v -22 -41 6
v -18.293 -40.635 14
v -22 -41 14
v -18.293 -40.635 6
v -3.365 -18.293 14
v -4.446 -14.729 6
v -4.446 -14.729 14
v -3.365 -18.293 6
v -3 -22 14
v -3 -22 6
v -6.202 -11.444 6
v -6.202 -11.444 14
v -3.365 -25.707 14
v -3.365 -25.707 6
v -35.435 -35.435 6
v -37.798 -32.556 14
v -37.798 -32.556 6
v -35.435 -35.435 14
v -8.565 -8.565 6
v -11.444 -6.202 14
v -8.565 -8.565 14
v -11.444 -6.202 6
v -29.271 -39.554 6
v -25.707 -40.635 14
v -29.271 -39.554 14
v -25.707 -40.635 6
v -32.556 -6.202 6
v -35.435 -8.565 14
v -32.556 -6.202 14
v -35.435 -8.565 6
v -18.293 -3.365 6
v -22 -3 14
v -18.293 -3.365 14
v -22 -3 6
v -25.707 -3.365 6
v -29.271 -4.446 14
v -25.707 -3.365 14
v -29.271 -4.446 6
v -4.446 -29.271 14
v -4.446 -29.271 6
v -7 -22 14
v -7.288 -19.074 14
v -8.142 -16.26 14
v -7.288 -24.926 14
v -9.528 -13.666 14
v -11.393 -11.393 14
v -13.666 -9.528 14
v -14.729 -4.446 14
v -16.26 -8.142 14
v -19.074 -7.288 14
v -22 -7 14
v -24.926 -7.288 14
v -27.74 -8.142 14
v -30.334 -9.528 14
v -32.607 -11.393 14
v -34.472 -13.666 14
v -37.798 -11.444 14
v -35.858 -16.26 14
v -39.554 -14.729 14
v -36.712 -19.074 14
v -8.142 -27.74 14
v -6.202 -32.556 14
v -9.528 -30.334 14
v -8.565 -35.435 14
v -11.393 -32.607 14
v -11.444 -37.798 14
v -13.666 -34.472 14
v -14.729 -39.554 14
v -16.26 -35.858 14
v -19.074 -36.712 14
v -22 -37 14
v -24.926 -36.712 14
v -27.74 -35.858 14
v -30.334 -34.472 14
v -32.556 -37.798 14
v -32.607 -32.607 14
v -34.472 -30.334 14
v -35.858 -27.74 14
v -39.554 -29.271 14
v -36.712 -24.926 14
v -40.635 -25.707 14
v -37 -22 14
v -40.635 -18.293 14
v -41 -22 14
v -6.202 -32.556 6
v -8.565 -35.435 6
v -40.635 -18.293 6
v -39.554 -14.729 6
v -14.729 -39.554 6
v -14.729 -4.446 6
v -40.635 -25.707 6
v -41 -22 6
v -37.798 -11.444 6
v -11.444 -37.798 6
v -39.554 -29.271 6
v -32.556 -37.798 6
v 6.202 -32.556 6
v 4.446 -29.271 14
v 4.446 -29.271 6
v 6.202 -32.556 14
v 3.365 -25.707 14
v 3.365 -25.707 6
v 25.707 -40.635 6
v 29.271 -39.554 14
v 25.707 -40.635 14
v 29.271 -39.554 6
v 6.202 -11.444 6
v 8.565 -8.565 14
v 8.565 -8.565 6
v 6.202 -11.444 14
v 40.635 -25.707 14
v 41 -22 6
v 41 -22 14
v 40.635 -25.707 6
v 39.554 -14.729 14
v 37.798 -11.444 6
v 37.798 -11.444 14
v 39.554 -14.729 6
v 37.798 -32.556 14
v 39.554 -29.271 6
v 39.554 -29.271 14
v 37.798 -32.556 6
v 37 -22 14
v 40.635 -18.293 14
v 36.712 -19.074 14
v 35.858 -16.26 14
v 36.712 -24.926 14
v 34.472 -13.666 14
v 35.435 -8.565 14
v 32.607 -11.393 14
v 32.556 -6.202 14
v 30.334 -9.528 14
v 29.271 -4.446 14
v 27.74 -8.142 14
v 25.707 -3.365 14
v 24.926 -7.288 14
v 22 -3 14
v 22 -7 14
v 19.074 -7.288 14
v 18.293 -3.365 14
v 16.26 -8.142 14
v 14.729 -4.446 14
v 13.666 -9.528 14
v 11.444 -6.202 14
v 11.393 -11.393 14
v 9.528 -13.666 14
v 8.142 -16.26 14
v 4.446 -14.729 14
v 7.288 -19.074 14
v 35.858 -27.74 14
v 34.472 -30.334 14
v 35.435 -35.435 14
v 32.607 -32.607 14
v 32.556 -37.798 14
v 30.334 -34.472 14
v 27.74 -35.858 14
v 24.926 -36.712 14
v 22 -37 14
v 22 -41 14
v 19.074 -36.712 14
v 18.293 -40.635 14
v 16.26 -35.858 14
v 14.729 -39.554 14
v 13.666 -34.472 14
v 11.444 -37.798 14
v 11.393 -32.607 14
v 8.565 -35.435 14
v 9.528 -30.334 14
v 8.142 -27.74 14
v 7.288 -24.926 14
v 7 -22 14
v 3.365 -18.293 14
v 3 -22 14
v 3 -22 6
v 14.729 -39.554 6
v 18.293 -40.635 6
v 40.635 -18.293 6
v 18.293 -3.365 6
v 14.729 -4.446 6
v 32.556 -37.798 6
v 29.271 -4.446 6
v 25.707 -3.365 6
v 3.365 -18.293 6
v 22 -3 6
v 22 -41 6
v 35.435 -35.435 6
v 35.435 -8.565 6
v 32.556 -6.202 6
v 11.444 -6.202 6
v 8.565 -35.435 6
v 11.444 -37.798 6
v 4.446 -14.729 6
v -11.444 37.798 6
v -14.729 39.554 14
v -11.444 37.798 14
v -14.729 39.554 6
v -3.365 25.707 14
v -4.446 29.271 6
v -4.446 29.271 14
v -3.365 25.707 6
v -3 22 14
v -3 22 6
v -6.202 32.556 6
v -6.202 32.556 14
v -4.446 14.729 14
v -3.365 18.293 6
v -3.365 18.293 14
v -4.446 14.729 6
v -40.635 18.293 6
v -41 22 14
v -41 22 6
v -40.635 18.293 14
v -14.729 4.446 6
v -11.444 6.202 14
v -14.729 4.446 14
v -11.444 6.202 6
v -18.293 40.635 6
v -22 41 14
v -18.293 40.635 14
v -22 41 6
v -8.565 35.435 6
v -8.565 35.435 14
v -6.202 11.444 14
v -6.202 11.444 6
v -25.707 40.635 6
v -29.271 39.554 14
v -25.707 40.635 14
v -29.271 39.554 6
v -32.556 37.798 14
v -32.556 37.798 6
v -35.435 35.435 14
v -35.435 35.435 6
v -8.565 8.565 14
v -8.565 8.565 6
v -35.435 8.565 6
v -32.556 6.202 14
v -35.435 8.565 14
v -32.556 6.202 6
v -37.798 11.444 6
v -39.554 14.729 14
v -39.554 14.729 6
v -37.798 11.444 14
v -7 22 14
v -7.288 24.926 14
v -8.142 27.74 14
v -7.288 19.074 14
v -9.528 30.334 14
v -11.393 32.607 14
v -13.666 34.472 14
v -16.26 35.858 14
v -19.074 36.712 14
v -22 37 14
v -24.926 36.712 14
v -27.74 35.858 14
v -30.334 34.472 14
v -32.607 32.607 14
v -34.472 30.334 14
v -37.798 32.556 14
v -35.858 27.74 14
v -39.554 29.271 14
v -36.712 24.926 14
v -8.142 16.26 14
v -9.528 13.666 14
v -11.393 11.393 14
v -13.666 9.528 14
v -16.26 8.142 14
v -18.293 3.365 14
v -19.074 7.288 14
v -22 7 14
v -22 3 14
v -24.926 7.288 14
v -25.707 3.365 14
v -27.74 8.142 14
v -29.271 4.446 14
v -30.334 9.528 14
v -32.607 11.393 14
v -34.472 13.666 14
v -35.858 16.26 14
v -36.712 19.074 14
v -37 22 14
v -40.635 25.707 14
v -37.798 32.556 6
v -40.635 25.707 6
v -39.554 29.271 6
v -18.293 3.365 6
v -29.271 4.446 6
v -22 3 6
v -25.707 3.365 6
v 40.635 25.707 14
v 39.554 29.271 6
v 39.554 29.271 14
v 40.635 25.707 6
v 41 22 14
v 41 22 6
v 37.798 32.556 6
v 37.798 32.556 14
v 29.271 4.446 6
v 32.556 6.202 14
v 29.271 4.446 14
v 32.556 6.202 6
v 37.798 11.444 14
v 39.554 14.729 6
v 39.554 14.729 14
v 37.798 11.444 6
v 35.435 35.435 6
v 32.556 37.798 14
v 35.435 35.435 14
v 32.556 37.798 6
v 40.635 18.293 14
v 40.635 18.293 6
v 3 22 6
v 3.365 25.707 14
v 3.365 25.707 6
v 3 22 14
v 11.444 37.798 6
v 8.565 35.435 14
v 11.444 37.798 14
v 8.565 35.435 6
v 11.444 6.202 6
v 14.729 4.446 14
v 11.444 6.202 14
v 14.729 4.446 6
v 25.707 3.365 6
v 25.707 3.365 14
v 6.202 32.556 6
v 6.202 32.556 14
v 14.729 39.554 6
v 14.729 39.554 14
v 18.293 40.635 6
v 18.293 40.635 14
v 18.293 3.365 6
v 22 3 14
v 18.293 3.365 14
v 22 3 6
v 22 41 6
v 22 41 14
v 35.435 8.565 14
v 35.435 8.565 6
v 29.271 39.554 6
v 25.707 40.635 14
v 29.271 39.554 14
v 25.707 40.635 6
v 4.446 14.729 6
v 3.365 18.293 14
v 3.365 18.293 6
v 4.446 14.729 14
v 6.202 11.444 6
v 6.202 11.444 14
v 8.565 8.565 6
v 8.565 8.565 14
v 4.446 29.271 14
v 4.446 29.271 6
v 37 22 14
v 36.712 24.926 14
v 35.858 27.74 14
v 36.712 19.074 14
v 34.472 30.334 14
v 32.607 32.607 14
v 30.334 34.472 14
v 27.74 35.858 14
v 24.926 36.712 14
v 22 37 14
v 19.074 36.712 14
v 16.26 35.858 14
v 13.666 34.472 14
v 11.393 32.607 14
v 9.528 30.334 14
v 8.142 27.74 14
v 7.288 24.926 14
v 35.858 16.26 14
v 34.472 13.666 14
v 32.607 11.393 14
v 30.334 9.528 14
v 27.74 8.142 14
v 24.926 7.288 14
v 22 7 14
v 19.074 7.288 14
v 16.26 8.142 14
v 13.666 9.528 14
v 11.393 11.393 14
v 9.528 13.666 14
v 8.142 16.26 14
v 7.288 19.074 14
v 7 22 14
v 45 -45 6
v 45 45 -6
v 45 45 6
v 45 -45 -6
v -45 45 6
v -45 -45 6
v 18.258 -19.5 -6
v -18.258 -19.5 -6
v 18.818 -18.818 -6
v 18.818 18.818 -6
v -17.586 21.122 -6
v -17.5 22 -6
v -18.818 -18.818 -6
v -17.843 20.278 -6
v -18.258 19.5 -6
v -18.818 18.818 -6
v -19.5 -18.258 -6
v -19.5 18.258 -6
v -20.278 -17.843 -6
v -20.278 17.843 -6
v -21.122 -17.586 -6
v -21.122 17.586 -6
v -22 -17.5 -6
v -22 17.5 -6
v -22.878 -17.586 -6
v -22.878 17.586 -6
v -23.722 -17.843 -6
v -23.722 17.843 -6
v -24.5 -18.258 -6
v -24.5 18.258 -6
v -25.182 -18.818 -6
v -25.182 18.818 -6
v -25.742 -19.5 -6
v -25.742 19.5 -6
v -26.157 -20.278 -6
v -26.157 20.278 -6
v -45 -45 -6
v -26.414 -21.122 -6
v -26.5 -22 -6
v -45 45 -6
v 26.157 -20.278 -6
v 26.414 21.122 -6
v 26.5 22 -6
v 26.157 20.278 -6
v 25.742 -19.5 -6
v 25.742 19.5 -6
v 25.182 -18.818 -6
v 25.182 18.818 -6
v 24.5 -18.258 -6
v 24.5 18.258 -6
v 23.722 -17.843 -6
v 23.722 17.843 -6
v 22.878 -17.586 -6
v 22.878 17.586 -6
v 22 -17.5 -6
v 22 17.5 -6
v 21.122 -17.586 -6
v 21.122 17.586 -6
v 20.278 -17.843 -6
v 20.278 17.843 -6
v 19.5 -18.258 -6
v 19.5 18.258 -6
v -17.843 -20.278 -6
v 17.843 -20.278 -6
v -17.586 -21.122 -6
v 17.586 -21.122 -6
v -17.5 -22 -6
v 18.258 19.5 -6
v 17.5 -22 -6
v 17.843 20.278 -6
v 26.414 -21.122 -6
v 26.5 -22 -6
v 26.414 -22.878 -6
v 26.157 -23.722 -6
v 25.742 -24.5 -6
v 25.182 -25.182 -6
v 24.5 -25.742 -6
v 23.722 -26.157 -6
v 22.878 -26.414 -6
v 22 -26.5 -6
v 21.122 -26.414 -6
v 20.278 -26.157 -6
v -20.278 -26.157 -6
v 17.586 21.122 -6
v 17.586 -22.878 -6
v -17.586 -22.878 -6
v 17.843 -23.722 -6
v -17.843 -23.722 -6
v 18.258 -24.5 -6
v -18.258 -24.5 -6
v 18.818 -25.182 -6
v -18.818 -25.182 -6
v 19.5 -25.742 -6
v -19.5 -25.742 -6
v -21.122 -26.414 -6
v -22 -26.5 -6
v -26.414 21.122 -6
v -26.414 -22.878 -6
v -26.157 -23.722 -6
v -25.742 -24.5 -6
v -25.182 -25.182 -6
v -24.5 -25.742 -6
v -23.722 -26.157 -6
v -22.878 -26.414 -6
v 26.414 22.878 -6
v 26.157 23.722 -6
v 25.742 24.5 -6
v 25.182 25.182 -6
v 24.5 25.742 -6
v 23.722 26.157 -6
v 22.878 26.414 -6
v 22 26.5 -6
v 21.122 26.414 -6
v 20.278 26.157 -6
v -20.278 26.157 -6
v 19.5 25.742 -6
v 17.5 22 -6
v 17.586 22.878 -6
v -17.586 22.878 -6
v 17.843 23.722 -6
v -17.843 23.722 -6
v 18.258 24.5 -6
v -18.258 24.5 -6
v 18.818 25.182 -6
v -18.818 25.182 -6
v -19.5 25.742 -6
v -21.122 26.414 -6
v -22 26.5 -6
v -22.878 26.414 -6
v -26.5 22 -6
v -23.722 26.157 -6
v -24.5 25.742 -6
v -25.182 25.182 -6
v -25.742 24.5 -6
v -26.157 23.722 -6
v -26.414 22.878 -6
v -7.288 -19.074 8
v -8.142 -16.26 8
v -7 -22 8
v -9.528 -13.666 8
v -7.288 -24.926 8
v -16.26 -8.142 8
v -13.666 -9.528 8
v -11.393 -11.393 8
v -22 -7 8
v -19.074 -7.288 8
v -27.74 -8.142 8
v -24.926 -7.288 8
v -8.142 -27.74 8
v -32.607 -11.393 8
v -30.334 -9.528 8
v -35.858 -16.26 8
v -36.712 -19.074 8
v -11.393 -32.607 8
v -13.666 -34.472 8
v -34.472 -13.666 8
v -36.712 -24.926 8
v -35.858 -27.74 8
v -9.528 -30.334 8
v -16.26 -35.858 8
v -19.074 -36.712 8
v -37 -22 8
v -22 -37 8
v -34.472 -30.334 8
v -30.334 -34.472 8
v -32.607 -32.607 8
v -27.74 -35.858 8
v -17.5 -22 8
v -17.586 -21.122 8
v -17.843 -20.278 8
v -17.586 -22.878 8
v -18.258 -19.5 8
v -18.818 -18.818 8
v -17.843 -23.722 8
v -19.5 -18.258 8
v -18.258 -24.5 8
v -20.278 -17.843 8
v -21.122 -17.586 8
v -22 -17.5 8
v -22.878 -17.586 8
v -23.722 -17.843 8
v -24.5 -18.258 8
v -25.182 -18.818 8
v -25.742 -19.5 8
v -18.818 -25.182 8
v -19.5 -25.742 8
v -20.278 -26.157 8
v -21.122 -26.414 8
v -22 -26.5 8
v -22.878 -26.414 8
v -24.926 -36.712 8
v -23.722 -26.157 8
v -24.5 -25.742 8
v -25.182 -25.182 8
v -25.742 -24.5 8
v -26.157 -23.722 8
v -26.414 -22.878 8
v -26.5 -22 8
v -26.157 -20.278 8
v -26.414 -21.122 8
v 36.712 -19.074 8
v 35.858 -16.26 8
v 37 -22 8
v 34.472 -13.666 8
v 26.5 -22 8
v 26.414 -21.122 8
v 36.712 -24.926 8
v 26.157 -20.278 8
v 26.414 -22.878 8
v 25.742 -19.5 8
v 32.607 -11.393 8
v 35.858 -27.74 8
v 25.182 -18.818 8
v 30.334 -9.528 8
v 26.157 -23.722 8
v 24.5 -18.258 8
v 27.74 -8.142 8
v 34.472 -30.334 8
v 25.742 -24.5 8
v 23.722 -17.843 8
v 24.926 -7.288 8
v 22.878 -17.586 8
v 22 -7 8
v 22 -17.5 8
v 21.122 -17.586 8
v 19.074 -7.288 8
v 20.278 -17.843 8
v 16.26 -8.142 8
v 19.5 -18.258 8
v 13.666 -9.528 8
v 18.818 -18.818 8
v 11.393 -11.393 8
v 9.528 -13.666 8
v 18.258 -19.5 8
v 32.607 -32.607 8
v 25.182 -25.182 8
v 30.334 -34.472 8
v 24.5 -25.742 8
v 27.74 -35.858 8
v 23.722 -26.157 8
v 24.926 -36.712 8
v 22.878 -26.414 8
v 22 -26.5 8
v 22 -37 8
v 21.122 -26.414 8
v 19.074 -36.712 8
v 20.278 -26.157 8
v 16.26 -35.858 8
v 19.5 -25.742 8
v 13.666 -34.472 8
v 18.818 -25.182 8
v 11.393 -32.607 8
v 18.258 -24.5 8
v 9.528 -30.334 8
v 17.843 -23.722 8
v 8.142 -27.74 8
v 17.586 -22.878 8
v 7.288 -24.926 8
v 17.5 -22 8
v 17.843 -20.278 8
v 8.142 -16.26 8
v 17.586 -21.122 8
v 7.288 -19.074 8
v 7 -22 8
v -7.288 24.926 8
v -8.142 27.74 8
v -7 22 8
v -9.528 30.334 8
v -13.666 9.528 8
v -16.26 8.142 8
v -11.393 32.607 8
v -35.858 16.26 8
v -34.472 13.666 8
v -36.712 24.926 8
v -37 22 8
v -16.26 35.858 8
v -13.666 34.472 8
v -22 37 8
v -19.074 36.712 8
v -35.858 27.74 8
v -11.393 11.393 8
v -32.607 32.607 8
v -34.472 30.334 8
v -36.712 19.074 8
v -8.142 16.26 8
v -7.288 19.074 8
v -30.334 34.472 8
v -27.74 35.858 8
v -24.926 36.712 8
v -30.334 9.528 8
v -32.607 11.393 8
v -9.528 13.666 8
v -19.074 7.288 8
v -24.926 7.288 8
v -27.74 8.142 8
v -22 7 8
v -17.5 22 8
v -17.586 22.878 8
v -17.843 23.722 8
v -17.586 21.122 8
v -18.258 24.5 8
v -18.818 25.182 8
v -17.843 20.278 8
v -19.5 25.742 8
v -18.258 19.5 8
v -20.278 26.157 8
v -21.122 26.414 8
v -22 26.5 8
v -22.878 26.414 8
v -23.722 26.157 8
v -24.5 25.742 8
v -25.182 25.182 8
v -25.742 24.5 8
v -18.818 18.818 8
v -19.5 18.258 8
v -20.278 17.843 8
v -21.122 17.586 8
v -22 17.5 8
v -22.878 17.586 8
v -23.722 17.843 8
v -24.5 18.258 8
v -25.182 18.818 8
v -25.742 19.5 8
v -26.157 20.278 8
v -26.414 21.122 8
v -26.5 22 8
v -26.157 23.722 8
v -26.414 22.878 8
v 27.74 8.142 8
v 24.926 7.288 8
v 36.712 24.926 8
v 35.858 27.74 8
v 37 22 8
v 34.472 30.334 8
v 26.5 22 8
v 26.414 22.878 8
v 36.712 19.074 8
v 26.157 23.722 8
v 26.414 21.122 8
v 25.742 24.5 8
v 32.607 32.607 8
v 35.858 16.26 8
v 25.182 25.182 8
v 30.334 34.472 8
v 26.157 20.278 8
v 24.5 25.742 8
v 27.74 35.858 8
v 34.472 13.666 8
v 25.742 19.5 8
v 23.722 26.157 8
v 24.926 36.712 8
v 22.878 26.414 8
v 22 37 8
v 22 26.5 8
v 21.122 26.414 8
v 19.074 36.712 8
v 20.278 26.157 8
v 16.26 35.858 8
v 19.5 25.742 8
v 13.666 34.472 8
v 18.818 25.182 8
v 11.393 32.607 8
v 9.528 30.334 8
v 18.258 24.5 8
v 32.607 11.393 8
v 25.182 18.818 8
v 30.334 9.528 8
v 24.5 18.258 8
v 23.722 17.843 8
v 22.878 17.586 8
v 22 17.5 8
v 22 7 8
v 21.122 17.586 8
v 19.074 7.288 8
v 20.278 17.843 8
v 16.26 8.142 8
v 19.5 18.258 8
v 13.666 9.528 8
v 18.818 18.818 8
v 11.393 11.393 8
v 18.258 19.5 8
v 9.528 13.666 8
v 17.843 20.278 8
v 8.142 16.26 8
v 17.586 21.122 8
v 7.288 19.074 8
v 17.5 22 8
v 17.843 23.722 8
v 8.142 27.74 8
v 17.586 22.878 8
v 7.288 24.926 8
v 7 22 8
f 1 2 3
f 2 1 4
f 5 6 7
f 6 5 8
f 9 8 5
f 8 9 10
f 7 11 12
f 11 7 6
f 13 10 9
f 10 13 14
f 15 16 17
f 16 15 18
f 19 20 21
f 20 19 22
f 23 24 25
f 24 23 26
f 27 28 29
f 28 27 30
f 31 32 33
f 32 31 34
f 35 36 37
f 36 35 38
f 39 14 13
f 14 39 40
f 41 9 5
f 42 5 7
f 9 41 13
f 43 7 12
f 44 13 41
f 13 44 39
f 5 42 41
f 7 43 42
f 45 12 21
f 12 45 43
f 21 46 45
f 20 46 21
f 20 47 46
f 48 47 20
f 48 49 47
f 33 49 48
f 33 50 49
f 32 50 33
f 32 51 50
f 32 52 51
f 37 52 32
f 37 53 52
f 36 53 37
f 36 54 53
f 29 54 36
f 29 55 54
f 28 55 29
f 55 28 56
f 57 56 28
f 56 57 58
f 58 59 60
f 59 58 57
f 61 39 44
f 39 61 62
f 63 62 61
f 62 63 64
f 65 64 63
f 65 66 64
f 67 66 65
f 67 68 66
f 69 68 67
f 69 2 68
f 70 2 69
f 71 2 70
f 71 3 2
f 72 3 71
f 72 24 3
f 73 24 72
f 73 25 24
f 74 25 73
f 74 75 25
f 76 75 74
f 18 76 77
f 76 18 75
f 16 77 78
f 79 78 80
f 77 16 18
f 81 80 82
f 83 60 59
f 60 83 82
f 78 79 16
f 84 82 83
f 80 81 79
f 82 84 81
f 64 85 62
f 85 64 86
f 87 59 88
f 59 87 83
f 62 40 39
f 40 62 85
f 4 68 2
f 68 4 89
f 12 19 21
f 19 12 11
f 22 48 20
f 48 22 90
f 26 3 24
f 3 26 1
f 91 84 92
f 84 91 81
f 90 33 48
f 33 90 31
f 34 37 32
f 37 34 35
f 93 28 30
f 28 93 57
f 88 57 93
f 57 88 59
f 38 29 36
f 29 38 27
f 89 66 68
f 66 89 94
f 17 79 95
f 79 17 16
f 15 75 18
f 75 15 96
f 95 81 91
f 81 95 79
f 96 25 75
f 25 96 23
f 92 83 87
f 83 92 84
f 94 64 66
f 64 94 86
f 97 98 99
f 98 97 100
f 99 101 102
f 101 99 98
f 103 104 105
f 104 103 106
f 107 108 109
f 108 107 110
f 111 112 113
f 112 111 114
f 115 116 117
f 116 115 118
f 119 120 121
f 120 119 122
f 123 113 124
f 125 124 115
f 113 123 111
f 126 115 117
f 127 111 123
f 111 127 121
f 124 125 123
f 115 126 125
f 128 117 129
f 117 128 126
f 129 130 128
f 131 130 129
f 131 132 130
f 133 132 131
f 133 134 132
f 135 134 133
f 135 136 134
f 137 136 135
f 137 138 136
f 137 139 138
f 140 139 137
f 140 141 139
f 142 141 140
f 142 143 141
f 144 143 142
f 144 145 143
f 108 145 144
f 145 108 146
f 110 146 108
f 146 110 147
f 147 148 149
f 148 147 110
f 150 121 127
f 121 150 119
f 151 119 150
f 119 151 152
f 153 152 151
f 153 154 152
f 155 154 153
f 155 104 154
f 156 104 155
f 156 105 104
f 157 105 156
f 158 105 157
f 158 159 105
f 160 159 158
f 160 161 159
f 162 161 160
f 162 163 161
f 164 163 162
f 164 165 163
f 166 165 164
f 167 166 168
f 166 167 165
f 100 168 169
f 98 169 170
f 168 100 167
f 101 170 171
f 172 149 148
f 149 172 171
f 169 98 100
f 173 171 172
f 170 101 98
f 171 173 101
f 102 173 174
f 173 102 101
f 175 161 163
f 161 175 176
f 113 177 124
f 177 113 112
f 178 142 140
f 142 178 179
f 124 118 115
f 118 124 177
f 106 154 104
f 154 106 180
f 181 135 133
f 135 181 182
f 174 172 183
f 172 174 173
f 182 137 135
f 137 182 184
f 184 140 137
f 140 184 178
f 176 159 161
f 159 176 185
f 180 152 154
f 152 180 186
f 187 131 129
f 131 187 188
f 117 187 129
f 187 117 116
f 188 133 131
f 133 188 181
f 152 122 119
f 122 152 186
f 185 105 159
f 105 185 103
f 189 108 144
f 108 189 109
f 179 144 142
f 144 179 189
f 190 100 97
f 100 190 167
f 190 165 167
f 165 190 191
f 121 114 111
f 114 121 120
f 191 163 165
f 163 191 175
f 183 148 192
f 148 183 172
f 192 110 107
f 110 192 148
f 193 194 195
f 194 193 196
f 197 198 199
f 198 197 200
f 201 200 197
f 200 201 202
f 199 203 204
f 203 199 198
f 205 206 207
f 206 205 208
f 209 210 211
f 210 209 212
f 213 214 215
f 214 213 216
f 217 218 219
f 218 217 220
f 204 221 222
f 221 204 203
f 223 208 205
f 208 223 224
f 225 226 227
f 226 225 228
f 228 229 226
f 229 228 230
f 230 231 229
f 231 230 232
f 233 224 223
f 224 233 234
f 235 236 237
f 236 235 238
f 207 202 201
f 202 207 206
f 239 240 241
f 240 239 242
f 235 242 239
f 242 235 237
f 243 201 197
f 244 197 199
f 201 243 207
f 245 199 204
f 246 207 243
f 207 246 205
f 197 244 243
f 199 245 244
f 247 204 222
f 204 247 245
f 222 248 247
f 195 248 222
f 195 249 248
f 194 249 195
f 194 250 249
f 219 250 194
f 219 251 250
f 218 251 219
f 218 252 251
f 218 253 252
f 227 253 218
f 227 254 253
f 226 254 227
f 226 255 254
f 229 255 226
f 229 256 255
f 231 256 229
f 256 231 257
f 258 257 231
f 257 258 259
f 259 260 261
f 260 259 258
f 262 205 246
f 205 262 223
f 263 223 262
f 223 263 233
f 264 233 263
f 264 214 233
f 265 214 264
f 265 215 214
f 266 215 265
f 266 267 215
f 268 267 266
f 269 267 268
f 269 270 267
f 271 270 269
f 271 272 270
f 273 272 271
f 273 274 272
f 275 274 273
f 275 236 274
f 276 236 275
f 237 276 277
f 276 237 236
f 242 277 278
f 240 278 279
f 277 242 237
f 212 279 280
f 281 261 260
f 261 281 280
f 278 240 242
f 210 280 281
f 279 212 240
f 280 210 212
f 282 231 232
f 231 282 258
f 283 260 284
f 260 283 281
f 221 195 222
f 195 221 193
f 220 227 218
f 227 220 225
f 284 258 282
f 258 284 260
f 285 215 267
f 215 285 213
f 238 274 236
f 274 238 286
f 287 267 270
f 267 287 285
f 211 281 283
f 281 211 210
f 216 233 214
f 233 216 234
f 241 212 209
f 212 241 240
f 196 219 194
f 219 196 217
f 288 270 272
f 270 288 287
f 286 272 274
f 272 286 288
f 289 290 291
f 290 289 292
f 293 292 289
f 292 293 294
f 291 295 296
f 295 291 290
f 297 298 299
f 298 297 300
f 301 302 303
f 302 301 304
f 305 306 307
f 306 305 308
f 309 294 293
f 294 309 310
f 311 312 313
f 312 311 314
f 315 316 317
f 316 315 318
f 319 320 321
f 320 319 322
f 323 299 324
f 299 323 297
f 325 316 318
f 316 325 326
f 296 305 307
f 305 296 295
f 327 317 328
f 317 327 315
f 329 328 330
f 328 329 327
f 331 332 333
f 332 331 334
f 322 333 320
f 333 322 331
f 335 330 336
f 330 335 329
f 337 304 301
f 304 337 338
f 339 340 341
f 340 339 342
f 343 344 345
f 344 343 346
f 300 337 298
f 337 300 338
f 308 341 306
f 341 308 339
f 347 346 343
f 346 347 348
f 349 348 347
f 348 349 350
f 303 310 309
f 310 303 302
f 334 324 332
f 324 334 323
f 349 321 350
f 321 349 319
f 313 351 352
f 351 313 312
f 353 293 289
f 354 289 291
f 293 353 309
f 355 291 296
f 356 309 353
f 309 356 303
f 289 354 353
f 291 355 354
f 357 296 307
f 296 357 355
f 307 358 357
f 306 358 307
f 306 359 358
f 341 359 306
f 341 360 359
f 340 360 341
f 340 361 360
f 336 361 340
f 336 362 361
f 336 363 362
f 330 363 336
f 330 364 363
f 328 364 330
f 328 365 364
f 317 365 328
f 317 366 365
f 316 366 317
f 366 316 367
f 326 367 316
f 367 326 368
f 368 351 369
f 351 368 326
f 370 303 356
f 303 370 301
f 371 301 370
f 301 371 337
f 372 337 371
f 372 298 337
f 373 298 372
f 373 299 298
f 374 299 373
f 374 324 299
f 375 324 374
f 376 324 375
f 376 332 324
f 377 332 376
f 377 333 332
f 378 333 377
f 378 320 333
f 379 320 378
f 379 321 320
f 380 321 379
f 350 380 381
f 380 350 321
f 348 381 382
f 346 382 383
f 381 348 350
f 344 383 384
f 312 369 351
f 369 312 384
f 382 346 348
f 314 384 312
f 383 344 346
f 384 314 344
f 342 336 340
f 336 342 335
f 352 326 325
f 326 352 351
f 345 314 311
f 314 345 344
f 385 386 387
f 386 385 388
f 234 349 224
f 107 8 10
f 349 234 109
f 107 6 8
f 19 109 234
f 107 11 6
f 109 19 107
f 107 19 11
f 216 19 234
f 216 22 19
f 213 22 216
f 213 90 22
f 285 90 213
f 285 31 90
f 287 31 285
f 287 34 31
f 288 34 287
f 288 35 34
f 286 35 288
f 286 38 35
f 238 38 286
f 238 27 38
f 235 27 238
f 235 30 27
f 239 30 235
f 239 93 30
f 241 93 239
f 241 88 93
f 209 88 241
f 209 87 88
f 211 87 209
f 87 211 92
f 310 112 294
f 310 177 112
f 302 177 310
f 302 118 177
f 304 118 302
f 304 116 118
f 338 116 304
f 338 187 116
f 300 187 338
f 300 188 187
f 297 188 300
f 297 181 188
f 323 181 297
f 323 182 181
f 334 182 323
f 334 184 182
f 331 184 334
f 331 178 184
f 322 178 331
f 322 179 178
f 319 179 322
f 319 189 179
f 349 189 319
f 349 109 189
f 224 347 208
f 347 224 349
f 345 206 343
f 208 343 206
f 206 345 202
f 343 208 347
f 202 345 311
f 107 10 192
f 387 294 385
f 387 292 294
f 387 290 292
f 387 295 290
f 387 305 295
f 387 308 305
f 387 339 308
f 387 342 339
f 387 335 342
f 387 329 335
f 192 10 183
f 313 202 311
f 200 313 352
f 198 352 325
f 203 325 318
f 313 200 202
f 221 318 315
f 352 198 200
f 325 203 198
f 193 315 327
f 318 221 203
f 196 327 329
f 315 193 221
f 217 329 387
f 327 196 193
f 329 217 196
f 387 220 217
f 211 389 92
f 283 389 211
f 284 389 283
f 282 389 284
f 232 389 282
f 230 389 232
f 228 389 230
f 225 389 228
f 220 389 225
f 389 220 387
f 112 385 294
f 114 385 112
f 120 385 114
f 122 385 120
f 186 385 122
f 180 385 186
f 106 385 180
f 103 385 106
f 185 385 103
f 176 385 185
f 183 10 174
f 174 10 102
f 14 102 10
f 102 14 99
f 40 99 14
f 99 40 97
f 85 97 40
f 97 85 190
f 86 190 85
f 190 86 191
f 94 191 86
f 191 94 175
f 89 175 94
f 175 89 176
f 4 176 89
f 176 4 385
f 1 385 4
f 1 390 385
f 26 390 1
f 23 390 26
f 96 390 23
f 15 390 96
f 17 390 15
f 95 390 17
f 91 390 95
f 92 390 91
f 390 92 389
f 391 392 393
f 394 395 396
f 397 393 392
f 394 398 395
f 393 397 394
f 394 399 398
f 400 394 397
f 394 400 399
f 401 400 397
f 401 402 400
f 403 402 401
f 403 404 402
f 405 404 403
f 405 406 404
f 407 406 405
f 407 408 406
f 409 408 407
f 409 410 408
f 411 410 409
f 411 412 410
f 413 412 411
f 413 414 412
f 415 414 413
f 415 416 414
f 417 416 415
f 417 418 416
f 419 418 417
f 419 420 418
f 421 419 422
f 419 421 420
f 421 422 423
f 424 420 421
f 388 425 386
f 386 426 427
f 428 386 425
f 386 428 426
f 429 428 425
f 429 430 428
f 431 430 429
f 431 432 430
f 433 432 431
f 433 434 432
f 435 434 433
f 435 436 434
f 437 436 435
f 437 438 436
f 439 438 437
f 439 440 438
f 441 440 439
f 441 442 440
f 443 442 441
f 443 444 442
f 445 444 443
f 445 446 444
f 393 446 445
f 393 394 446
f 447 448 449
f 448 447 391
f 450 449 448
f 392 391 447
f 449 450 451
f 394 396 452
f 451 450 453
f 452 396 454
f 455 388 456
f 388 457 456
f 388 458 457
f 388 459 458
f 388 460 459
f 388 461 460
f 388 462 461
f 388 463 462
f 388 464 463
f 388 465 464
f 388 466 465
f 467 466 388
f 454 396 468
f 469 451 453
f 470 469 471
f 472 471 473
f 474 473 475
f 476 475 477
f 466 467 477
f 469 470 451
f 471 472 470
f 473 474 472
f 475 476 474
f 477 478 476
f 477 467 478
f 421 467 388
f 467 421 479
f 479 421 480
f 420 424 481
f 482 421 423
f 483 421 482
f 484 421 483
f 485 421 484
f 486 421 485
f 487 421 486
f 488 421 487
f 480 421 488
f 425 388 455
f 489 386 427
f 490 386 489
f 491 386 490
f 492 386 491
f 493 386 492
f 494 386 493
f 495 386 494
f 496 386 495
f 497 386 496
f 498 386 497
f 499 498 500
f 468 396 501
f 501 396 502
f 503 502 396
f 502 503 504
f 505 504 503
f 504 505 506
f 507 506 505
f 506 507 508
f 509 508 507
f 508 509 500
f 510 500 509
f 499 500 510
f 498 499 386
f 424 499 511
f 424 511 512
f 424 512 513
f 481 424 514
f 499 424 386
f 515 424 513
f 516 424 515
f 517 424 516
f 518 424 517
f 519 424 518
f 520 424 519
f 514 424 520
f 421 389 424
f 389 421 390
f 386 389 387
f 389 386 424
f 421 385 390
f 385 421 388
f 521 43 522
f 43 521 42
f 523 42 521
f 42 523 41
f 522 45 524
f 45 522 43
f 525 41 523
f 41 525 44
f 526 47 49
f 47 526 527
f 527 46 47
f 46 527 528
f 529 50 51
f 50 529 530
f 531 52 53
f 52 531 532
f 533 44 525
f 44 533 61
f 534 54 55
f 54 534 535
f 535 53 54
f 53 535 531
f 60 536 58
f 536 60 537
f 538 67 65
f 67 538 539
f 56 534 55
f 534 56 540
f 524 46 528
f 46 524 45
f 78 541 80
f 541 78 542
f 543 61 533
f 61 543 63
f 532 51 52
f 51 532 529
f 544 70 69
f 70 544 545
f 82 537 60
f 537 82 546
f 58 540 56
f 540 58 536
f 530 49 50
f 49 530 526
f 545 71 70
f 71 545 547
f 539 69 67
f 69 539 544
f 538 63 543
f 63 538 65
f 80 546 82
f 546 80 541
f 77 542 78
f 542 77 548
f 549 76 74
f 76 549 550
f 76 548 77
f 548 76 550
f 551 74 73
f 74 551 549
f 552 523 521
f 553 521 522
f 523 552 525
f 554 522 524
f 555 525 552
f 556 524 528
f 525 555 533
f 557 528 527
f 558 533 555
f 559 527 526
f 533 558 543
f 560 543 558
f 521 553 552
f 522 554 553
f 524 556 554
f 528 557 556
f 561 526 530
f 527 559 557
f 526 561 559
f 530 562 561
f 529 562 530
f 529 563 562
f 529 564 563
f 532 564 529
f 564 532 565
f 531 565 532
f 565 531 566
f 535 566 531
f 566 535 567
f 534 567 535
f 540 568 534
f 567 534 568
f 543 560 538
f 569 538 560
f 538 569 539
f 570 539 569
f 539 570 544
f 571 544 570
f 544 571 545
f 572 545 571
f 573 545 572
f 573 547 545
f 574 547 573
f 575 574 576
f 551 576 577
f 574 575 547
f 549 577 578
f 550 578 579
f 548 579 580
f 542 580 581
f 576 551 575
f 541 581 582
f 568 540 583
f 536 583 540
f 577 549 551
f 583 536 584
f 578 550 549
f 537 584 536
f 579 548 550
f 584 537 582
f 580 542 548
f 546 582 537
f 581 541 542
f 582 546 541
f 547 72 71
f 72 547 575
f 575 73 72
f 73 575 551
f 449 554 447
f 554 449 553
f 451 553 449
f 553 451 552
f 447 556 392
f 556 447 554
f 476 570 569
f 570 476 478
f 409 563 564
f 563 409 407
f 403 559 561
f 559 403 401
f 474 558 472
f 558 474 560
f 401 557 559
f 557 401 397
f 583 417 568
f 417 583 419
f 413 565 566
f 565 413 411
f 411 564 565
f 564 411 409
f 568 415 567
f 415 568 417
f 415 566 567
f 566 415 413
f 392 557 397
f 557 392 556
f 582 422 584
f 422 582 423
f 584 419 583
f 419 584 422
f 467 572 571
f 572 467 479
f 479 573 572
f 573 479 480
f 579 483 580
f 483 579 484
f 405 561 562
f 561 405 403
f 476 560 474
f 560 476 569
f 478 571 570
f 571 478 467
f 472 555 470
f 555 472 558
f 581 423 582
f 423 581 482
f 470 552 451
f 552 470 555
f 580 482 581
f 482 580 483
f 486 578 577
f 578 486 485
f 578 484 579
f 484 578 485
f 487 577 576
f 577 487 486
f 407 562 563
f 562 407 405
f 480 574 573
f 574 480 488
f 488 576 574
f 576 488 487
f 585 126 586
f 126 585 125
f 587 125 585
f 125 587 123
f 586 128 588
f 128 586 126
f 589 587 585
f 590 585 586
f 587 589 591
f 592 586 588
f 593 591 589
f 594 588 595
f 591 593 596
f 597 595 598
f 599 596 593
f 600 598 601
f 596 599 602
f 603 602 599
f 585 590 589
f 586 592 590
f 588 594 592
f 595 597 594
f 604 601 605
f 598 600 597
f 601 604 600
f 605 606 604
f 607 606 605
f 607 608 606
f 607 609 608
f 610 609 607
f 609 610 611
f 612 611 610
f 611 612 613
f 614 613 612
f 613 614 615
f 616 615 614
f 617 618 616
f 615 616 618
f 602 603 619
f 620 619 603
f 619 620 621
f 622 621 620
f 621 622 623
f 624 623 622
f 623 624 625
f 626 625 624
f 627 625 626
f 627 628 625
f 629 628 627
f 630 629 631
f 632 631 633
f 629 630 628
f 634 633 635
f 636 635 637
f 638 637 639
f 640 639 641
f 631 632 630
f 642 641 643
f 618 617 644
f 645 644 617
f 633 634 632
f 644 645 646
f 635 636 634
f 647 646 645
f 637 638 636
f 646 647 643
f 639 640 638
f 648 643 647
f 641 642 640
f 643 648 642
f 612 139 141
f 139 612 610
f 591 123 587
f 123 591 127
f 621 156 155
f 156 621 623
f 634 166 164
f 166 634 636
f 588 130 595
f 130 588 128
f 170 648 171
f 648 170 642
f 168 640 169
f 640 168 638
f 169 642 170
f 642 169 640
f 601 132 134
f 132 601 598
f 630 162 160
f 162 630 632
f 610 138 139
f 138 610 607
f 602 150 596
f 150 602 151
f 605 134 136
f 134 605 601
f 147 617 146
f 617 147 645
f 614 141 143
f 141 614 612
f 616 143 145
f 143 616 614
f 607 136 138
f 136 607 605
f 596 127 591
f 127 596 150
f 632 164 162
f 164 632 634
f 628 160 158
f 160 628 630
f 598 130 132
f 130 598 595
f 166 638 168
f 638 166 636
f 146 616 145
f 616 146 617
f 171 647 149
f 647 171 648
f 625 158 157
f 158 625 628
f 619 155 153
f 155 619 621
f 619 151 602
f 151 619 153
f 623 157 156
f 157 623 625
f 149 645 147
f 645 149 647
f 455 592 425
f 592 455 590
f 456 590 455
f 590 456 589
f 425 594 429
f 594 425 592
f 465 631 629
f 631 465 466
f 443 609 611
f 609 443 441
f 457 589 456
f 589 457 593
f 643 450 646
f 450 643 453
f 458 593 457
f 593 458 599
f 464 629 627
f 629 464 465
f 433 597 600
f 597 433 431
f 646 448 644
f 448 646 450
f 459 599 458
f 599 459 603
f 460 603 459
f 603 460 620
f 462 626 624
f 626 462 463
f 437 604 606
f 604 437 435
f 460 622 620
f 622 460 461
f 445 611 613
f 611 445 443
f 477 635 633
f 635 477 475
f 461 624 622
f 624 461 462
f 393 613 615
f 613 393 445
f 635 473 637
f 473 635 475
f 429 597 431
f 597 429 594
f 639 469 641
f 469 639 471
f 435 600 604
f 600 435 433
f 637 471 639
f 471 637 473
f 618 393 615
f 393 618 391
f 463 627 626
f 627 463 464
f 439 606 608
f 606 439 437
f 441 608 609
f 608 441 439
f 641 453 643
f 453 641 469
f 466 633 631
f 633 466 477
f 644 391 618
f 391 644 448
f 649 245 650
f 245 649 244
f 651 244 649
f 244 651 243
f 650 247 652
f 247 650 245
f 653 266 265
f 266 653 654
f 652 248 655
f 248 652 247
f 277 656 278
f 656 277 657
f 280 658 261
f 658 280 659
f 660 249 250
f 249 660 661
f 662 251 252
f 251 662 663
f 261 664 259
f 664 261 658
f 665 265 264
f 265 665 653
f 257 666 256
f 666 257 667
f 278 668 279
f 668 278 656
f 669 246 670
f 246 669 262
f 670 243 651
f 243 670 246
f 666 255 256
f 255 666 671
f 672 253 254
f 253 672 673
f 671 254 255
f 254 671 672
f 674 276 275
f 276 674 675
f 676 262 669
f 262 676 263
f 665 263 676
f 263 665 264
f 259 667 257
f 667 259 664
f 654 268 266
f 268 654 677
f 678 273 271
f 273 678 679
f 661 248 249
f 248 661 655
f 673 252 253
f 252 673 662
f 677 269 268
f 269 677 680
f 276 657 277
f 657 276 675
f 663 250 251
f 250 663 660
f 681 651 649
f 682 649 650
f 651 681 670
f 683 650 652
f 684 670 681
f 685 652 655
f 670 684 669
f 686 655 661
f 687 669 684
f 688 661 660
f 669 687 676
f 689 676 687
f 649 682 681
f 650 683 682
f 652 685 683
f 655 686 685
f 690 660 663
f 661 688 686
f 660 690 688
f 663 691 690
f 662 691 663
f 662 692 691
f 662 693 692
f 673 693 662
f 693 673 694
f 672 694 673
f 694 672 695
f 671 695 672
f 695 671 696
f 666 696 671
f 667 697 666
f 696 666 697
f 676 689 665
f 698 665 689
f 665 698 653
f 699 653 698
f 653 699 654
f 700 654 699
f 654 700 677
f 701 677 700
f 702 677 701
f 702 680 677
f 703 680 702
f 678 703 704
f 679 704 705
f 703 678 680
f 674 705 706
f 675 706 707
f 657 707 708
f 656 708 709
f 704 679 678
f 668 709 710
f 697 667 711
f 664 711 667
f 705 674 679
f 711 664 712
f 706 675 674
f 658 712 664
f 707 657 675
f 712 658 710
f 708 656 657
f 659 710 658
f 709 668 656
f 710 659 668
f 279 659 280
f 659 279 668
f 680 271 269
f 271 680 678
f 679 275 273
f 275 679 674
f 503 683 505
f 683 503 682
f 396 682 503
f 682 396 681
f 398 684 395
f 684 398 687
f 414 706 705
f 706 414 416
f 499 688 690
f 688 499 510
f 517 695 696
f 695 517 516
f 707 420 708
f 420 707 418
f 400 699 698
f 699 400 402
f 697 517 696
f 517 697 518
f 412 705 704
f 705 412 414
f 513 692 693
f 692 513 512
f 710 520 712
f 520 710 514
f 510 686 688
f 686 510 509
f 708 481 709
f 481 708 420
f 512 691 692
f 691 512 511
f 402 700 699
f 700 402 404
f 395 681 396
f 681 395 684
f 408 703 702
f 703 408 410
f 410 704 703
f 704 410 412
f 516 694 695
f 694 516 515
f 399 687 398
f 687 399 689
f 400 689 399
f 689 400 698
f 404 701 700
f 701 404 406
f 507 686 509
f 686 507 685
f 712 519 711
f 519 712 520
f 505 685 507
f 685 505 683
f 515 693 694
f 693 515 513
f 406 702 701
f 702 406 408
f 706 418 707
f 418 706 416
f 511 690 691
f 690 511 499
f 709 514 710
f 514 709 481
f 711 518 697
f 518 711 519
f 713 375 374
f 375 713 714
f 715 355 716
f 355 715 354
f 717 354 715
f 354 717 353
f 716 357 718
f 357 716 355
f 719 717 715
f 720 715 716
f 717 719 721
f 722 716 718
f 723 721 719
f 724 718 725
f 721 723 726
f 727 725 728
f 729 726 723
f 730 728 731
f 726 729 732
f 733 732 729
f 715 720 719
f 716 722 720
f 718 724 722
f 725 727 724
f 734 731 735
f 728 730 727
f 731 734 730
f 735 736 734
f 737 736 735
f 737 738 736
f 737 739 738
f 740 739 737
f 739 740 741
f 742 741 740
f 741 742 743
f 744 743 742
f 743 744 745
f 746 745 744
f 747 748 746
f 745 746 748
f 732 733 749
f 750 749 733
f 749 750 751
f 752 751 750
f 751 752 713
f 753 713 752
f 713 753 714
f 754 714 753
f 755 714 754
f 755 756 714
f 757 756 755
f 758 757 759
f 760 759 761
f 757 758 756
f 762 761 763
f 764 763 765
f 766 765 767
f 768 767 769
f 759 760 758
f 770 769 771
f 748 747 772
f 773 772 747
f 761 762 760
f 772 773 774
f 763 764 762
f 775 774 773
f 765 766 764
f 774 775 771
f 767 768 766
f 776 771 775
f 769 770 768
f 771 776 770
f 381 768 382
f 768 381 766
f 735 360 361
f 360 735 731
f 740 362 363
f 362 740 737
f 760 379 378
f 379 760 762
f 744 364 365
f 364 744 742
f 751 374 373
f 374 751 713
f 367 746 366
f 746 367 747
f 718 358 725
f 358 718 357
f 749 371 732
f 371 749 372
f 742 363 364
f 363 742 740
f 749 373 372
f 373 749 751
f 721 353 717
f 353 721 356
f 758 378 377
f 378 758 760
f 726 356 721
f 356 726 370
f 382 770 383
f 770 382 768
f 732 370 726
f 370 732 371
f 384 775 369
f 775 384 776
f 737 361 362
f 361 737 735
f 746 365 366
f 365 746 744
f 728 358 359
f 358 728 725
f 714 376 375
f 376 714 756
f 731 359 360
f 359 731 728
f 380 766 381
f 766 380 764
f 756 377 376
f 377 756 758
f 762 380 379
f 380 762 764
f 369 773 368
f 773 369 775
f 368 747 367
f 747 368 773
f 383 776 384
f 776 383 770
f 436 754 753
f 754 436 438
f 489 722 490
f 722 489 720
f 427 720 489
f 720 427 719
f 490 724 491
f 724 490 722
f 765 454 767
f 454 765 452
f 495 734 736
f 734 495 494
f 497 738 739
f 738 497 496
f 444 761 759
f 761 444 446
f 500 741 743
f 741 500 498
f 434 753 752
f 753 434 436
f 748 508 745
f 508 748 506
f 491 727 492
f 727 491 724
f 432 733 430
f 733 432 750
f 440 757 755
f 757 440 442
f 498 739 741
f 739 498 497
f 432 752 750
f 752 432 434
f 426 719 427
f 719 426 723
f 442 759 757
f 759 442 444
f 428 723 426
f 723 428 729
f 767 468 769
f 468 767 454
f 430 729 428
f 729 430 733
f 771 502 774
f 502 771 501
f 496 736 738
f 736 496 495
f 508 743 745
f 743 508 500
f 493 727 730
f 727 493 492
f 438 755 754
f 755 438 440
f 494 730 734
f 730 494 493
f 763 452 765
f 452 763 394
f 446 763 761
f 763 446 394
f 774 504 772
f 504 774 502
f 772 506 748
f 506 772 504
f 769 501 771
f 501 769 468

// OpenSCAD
$fn = 32;

// ----------------------------------------------------------------------
// Socket pad plate
// bosses with counterbored sockets for the screws
// ----------------------------------------------------------------------

// --- parameters (mm) ---
base_t = 12;       // base plate thickness
boss_h = 8;        // boss height above the base plate
boss_d = 38;       // boss diameter
socket_d = 30;     // socket diameter
socket_depth = 6;  // socket depth from the boss face
bolt_d = 9;        // screw clearance hole through the socket floor
rows = 2;          // boss rows
cols = 2;          // bosses per row
pitch = 44;        // boss pitch

// --- derived feature positions (mm) ---
height = base_t + boss_h;           // = 20   overall height of the part
plate = [pitch * (cols - 1) + boss_d + 8, pitch * (rows - 1) + boss_d + 8, base_t];  // = [90, 90, 12]   overall size (x, y, z)
span_x = pitch * (cols - 1);        // = 44   distance between outer bosses
span_y = pitch * (rows - 1);        // = 44   distance between boss rows
origin_x = -span_x / 2;             // = -22   X of the first boss
origin_y = -span_y / 2;             // = -22   Y of the first boss
feature_centers = [
  [origin_x + 0 * pitch, origin_y + 0 * pitch],
  [origin_x + 1 * pitch, origin_y + 0 * pitch],
  [origin_x + 0 * pitch, origin_y + 1 * pitch],
  [origin_x + 1 * pitch, origin_y + 1 * pitch]
];   // boss centres: sockets, holes and the pads themselves are placed from here

// base plate, bosses on feature_centers, socket + through hole in each
difference() {
  union() {
    cube(plate, center = true);
    for (centre = feature_centers)
      translate([centre[0], centre[1], plate[2] / 2 - 1])
        cylinder(d = boss_d, h = boss_h + 1);
  }
  for (centre = feature_centers) {
    translate([centre[0], centre[1], plate[2] / 2 + boss_h - socket_depth])
      cylinder(d = socket_d, h = socket_depth + 1);
    translate([centre[0], centre[1], -height])
      cylinder(d = bolt_d, h = 2 * height + 2);  // through the socket floor
  }
}
